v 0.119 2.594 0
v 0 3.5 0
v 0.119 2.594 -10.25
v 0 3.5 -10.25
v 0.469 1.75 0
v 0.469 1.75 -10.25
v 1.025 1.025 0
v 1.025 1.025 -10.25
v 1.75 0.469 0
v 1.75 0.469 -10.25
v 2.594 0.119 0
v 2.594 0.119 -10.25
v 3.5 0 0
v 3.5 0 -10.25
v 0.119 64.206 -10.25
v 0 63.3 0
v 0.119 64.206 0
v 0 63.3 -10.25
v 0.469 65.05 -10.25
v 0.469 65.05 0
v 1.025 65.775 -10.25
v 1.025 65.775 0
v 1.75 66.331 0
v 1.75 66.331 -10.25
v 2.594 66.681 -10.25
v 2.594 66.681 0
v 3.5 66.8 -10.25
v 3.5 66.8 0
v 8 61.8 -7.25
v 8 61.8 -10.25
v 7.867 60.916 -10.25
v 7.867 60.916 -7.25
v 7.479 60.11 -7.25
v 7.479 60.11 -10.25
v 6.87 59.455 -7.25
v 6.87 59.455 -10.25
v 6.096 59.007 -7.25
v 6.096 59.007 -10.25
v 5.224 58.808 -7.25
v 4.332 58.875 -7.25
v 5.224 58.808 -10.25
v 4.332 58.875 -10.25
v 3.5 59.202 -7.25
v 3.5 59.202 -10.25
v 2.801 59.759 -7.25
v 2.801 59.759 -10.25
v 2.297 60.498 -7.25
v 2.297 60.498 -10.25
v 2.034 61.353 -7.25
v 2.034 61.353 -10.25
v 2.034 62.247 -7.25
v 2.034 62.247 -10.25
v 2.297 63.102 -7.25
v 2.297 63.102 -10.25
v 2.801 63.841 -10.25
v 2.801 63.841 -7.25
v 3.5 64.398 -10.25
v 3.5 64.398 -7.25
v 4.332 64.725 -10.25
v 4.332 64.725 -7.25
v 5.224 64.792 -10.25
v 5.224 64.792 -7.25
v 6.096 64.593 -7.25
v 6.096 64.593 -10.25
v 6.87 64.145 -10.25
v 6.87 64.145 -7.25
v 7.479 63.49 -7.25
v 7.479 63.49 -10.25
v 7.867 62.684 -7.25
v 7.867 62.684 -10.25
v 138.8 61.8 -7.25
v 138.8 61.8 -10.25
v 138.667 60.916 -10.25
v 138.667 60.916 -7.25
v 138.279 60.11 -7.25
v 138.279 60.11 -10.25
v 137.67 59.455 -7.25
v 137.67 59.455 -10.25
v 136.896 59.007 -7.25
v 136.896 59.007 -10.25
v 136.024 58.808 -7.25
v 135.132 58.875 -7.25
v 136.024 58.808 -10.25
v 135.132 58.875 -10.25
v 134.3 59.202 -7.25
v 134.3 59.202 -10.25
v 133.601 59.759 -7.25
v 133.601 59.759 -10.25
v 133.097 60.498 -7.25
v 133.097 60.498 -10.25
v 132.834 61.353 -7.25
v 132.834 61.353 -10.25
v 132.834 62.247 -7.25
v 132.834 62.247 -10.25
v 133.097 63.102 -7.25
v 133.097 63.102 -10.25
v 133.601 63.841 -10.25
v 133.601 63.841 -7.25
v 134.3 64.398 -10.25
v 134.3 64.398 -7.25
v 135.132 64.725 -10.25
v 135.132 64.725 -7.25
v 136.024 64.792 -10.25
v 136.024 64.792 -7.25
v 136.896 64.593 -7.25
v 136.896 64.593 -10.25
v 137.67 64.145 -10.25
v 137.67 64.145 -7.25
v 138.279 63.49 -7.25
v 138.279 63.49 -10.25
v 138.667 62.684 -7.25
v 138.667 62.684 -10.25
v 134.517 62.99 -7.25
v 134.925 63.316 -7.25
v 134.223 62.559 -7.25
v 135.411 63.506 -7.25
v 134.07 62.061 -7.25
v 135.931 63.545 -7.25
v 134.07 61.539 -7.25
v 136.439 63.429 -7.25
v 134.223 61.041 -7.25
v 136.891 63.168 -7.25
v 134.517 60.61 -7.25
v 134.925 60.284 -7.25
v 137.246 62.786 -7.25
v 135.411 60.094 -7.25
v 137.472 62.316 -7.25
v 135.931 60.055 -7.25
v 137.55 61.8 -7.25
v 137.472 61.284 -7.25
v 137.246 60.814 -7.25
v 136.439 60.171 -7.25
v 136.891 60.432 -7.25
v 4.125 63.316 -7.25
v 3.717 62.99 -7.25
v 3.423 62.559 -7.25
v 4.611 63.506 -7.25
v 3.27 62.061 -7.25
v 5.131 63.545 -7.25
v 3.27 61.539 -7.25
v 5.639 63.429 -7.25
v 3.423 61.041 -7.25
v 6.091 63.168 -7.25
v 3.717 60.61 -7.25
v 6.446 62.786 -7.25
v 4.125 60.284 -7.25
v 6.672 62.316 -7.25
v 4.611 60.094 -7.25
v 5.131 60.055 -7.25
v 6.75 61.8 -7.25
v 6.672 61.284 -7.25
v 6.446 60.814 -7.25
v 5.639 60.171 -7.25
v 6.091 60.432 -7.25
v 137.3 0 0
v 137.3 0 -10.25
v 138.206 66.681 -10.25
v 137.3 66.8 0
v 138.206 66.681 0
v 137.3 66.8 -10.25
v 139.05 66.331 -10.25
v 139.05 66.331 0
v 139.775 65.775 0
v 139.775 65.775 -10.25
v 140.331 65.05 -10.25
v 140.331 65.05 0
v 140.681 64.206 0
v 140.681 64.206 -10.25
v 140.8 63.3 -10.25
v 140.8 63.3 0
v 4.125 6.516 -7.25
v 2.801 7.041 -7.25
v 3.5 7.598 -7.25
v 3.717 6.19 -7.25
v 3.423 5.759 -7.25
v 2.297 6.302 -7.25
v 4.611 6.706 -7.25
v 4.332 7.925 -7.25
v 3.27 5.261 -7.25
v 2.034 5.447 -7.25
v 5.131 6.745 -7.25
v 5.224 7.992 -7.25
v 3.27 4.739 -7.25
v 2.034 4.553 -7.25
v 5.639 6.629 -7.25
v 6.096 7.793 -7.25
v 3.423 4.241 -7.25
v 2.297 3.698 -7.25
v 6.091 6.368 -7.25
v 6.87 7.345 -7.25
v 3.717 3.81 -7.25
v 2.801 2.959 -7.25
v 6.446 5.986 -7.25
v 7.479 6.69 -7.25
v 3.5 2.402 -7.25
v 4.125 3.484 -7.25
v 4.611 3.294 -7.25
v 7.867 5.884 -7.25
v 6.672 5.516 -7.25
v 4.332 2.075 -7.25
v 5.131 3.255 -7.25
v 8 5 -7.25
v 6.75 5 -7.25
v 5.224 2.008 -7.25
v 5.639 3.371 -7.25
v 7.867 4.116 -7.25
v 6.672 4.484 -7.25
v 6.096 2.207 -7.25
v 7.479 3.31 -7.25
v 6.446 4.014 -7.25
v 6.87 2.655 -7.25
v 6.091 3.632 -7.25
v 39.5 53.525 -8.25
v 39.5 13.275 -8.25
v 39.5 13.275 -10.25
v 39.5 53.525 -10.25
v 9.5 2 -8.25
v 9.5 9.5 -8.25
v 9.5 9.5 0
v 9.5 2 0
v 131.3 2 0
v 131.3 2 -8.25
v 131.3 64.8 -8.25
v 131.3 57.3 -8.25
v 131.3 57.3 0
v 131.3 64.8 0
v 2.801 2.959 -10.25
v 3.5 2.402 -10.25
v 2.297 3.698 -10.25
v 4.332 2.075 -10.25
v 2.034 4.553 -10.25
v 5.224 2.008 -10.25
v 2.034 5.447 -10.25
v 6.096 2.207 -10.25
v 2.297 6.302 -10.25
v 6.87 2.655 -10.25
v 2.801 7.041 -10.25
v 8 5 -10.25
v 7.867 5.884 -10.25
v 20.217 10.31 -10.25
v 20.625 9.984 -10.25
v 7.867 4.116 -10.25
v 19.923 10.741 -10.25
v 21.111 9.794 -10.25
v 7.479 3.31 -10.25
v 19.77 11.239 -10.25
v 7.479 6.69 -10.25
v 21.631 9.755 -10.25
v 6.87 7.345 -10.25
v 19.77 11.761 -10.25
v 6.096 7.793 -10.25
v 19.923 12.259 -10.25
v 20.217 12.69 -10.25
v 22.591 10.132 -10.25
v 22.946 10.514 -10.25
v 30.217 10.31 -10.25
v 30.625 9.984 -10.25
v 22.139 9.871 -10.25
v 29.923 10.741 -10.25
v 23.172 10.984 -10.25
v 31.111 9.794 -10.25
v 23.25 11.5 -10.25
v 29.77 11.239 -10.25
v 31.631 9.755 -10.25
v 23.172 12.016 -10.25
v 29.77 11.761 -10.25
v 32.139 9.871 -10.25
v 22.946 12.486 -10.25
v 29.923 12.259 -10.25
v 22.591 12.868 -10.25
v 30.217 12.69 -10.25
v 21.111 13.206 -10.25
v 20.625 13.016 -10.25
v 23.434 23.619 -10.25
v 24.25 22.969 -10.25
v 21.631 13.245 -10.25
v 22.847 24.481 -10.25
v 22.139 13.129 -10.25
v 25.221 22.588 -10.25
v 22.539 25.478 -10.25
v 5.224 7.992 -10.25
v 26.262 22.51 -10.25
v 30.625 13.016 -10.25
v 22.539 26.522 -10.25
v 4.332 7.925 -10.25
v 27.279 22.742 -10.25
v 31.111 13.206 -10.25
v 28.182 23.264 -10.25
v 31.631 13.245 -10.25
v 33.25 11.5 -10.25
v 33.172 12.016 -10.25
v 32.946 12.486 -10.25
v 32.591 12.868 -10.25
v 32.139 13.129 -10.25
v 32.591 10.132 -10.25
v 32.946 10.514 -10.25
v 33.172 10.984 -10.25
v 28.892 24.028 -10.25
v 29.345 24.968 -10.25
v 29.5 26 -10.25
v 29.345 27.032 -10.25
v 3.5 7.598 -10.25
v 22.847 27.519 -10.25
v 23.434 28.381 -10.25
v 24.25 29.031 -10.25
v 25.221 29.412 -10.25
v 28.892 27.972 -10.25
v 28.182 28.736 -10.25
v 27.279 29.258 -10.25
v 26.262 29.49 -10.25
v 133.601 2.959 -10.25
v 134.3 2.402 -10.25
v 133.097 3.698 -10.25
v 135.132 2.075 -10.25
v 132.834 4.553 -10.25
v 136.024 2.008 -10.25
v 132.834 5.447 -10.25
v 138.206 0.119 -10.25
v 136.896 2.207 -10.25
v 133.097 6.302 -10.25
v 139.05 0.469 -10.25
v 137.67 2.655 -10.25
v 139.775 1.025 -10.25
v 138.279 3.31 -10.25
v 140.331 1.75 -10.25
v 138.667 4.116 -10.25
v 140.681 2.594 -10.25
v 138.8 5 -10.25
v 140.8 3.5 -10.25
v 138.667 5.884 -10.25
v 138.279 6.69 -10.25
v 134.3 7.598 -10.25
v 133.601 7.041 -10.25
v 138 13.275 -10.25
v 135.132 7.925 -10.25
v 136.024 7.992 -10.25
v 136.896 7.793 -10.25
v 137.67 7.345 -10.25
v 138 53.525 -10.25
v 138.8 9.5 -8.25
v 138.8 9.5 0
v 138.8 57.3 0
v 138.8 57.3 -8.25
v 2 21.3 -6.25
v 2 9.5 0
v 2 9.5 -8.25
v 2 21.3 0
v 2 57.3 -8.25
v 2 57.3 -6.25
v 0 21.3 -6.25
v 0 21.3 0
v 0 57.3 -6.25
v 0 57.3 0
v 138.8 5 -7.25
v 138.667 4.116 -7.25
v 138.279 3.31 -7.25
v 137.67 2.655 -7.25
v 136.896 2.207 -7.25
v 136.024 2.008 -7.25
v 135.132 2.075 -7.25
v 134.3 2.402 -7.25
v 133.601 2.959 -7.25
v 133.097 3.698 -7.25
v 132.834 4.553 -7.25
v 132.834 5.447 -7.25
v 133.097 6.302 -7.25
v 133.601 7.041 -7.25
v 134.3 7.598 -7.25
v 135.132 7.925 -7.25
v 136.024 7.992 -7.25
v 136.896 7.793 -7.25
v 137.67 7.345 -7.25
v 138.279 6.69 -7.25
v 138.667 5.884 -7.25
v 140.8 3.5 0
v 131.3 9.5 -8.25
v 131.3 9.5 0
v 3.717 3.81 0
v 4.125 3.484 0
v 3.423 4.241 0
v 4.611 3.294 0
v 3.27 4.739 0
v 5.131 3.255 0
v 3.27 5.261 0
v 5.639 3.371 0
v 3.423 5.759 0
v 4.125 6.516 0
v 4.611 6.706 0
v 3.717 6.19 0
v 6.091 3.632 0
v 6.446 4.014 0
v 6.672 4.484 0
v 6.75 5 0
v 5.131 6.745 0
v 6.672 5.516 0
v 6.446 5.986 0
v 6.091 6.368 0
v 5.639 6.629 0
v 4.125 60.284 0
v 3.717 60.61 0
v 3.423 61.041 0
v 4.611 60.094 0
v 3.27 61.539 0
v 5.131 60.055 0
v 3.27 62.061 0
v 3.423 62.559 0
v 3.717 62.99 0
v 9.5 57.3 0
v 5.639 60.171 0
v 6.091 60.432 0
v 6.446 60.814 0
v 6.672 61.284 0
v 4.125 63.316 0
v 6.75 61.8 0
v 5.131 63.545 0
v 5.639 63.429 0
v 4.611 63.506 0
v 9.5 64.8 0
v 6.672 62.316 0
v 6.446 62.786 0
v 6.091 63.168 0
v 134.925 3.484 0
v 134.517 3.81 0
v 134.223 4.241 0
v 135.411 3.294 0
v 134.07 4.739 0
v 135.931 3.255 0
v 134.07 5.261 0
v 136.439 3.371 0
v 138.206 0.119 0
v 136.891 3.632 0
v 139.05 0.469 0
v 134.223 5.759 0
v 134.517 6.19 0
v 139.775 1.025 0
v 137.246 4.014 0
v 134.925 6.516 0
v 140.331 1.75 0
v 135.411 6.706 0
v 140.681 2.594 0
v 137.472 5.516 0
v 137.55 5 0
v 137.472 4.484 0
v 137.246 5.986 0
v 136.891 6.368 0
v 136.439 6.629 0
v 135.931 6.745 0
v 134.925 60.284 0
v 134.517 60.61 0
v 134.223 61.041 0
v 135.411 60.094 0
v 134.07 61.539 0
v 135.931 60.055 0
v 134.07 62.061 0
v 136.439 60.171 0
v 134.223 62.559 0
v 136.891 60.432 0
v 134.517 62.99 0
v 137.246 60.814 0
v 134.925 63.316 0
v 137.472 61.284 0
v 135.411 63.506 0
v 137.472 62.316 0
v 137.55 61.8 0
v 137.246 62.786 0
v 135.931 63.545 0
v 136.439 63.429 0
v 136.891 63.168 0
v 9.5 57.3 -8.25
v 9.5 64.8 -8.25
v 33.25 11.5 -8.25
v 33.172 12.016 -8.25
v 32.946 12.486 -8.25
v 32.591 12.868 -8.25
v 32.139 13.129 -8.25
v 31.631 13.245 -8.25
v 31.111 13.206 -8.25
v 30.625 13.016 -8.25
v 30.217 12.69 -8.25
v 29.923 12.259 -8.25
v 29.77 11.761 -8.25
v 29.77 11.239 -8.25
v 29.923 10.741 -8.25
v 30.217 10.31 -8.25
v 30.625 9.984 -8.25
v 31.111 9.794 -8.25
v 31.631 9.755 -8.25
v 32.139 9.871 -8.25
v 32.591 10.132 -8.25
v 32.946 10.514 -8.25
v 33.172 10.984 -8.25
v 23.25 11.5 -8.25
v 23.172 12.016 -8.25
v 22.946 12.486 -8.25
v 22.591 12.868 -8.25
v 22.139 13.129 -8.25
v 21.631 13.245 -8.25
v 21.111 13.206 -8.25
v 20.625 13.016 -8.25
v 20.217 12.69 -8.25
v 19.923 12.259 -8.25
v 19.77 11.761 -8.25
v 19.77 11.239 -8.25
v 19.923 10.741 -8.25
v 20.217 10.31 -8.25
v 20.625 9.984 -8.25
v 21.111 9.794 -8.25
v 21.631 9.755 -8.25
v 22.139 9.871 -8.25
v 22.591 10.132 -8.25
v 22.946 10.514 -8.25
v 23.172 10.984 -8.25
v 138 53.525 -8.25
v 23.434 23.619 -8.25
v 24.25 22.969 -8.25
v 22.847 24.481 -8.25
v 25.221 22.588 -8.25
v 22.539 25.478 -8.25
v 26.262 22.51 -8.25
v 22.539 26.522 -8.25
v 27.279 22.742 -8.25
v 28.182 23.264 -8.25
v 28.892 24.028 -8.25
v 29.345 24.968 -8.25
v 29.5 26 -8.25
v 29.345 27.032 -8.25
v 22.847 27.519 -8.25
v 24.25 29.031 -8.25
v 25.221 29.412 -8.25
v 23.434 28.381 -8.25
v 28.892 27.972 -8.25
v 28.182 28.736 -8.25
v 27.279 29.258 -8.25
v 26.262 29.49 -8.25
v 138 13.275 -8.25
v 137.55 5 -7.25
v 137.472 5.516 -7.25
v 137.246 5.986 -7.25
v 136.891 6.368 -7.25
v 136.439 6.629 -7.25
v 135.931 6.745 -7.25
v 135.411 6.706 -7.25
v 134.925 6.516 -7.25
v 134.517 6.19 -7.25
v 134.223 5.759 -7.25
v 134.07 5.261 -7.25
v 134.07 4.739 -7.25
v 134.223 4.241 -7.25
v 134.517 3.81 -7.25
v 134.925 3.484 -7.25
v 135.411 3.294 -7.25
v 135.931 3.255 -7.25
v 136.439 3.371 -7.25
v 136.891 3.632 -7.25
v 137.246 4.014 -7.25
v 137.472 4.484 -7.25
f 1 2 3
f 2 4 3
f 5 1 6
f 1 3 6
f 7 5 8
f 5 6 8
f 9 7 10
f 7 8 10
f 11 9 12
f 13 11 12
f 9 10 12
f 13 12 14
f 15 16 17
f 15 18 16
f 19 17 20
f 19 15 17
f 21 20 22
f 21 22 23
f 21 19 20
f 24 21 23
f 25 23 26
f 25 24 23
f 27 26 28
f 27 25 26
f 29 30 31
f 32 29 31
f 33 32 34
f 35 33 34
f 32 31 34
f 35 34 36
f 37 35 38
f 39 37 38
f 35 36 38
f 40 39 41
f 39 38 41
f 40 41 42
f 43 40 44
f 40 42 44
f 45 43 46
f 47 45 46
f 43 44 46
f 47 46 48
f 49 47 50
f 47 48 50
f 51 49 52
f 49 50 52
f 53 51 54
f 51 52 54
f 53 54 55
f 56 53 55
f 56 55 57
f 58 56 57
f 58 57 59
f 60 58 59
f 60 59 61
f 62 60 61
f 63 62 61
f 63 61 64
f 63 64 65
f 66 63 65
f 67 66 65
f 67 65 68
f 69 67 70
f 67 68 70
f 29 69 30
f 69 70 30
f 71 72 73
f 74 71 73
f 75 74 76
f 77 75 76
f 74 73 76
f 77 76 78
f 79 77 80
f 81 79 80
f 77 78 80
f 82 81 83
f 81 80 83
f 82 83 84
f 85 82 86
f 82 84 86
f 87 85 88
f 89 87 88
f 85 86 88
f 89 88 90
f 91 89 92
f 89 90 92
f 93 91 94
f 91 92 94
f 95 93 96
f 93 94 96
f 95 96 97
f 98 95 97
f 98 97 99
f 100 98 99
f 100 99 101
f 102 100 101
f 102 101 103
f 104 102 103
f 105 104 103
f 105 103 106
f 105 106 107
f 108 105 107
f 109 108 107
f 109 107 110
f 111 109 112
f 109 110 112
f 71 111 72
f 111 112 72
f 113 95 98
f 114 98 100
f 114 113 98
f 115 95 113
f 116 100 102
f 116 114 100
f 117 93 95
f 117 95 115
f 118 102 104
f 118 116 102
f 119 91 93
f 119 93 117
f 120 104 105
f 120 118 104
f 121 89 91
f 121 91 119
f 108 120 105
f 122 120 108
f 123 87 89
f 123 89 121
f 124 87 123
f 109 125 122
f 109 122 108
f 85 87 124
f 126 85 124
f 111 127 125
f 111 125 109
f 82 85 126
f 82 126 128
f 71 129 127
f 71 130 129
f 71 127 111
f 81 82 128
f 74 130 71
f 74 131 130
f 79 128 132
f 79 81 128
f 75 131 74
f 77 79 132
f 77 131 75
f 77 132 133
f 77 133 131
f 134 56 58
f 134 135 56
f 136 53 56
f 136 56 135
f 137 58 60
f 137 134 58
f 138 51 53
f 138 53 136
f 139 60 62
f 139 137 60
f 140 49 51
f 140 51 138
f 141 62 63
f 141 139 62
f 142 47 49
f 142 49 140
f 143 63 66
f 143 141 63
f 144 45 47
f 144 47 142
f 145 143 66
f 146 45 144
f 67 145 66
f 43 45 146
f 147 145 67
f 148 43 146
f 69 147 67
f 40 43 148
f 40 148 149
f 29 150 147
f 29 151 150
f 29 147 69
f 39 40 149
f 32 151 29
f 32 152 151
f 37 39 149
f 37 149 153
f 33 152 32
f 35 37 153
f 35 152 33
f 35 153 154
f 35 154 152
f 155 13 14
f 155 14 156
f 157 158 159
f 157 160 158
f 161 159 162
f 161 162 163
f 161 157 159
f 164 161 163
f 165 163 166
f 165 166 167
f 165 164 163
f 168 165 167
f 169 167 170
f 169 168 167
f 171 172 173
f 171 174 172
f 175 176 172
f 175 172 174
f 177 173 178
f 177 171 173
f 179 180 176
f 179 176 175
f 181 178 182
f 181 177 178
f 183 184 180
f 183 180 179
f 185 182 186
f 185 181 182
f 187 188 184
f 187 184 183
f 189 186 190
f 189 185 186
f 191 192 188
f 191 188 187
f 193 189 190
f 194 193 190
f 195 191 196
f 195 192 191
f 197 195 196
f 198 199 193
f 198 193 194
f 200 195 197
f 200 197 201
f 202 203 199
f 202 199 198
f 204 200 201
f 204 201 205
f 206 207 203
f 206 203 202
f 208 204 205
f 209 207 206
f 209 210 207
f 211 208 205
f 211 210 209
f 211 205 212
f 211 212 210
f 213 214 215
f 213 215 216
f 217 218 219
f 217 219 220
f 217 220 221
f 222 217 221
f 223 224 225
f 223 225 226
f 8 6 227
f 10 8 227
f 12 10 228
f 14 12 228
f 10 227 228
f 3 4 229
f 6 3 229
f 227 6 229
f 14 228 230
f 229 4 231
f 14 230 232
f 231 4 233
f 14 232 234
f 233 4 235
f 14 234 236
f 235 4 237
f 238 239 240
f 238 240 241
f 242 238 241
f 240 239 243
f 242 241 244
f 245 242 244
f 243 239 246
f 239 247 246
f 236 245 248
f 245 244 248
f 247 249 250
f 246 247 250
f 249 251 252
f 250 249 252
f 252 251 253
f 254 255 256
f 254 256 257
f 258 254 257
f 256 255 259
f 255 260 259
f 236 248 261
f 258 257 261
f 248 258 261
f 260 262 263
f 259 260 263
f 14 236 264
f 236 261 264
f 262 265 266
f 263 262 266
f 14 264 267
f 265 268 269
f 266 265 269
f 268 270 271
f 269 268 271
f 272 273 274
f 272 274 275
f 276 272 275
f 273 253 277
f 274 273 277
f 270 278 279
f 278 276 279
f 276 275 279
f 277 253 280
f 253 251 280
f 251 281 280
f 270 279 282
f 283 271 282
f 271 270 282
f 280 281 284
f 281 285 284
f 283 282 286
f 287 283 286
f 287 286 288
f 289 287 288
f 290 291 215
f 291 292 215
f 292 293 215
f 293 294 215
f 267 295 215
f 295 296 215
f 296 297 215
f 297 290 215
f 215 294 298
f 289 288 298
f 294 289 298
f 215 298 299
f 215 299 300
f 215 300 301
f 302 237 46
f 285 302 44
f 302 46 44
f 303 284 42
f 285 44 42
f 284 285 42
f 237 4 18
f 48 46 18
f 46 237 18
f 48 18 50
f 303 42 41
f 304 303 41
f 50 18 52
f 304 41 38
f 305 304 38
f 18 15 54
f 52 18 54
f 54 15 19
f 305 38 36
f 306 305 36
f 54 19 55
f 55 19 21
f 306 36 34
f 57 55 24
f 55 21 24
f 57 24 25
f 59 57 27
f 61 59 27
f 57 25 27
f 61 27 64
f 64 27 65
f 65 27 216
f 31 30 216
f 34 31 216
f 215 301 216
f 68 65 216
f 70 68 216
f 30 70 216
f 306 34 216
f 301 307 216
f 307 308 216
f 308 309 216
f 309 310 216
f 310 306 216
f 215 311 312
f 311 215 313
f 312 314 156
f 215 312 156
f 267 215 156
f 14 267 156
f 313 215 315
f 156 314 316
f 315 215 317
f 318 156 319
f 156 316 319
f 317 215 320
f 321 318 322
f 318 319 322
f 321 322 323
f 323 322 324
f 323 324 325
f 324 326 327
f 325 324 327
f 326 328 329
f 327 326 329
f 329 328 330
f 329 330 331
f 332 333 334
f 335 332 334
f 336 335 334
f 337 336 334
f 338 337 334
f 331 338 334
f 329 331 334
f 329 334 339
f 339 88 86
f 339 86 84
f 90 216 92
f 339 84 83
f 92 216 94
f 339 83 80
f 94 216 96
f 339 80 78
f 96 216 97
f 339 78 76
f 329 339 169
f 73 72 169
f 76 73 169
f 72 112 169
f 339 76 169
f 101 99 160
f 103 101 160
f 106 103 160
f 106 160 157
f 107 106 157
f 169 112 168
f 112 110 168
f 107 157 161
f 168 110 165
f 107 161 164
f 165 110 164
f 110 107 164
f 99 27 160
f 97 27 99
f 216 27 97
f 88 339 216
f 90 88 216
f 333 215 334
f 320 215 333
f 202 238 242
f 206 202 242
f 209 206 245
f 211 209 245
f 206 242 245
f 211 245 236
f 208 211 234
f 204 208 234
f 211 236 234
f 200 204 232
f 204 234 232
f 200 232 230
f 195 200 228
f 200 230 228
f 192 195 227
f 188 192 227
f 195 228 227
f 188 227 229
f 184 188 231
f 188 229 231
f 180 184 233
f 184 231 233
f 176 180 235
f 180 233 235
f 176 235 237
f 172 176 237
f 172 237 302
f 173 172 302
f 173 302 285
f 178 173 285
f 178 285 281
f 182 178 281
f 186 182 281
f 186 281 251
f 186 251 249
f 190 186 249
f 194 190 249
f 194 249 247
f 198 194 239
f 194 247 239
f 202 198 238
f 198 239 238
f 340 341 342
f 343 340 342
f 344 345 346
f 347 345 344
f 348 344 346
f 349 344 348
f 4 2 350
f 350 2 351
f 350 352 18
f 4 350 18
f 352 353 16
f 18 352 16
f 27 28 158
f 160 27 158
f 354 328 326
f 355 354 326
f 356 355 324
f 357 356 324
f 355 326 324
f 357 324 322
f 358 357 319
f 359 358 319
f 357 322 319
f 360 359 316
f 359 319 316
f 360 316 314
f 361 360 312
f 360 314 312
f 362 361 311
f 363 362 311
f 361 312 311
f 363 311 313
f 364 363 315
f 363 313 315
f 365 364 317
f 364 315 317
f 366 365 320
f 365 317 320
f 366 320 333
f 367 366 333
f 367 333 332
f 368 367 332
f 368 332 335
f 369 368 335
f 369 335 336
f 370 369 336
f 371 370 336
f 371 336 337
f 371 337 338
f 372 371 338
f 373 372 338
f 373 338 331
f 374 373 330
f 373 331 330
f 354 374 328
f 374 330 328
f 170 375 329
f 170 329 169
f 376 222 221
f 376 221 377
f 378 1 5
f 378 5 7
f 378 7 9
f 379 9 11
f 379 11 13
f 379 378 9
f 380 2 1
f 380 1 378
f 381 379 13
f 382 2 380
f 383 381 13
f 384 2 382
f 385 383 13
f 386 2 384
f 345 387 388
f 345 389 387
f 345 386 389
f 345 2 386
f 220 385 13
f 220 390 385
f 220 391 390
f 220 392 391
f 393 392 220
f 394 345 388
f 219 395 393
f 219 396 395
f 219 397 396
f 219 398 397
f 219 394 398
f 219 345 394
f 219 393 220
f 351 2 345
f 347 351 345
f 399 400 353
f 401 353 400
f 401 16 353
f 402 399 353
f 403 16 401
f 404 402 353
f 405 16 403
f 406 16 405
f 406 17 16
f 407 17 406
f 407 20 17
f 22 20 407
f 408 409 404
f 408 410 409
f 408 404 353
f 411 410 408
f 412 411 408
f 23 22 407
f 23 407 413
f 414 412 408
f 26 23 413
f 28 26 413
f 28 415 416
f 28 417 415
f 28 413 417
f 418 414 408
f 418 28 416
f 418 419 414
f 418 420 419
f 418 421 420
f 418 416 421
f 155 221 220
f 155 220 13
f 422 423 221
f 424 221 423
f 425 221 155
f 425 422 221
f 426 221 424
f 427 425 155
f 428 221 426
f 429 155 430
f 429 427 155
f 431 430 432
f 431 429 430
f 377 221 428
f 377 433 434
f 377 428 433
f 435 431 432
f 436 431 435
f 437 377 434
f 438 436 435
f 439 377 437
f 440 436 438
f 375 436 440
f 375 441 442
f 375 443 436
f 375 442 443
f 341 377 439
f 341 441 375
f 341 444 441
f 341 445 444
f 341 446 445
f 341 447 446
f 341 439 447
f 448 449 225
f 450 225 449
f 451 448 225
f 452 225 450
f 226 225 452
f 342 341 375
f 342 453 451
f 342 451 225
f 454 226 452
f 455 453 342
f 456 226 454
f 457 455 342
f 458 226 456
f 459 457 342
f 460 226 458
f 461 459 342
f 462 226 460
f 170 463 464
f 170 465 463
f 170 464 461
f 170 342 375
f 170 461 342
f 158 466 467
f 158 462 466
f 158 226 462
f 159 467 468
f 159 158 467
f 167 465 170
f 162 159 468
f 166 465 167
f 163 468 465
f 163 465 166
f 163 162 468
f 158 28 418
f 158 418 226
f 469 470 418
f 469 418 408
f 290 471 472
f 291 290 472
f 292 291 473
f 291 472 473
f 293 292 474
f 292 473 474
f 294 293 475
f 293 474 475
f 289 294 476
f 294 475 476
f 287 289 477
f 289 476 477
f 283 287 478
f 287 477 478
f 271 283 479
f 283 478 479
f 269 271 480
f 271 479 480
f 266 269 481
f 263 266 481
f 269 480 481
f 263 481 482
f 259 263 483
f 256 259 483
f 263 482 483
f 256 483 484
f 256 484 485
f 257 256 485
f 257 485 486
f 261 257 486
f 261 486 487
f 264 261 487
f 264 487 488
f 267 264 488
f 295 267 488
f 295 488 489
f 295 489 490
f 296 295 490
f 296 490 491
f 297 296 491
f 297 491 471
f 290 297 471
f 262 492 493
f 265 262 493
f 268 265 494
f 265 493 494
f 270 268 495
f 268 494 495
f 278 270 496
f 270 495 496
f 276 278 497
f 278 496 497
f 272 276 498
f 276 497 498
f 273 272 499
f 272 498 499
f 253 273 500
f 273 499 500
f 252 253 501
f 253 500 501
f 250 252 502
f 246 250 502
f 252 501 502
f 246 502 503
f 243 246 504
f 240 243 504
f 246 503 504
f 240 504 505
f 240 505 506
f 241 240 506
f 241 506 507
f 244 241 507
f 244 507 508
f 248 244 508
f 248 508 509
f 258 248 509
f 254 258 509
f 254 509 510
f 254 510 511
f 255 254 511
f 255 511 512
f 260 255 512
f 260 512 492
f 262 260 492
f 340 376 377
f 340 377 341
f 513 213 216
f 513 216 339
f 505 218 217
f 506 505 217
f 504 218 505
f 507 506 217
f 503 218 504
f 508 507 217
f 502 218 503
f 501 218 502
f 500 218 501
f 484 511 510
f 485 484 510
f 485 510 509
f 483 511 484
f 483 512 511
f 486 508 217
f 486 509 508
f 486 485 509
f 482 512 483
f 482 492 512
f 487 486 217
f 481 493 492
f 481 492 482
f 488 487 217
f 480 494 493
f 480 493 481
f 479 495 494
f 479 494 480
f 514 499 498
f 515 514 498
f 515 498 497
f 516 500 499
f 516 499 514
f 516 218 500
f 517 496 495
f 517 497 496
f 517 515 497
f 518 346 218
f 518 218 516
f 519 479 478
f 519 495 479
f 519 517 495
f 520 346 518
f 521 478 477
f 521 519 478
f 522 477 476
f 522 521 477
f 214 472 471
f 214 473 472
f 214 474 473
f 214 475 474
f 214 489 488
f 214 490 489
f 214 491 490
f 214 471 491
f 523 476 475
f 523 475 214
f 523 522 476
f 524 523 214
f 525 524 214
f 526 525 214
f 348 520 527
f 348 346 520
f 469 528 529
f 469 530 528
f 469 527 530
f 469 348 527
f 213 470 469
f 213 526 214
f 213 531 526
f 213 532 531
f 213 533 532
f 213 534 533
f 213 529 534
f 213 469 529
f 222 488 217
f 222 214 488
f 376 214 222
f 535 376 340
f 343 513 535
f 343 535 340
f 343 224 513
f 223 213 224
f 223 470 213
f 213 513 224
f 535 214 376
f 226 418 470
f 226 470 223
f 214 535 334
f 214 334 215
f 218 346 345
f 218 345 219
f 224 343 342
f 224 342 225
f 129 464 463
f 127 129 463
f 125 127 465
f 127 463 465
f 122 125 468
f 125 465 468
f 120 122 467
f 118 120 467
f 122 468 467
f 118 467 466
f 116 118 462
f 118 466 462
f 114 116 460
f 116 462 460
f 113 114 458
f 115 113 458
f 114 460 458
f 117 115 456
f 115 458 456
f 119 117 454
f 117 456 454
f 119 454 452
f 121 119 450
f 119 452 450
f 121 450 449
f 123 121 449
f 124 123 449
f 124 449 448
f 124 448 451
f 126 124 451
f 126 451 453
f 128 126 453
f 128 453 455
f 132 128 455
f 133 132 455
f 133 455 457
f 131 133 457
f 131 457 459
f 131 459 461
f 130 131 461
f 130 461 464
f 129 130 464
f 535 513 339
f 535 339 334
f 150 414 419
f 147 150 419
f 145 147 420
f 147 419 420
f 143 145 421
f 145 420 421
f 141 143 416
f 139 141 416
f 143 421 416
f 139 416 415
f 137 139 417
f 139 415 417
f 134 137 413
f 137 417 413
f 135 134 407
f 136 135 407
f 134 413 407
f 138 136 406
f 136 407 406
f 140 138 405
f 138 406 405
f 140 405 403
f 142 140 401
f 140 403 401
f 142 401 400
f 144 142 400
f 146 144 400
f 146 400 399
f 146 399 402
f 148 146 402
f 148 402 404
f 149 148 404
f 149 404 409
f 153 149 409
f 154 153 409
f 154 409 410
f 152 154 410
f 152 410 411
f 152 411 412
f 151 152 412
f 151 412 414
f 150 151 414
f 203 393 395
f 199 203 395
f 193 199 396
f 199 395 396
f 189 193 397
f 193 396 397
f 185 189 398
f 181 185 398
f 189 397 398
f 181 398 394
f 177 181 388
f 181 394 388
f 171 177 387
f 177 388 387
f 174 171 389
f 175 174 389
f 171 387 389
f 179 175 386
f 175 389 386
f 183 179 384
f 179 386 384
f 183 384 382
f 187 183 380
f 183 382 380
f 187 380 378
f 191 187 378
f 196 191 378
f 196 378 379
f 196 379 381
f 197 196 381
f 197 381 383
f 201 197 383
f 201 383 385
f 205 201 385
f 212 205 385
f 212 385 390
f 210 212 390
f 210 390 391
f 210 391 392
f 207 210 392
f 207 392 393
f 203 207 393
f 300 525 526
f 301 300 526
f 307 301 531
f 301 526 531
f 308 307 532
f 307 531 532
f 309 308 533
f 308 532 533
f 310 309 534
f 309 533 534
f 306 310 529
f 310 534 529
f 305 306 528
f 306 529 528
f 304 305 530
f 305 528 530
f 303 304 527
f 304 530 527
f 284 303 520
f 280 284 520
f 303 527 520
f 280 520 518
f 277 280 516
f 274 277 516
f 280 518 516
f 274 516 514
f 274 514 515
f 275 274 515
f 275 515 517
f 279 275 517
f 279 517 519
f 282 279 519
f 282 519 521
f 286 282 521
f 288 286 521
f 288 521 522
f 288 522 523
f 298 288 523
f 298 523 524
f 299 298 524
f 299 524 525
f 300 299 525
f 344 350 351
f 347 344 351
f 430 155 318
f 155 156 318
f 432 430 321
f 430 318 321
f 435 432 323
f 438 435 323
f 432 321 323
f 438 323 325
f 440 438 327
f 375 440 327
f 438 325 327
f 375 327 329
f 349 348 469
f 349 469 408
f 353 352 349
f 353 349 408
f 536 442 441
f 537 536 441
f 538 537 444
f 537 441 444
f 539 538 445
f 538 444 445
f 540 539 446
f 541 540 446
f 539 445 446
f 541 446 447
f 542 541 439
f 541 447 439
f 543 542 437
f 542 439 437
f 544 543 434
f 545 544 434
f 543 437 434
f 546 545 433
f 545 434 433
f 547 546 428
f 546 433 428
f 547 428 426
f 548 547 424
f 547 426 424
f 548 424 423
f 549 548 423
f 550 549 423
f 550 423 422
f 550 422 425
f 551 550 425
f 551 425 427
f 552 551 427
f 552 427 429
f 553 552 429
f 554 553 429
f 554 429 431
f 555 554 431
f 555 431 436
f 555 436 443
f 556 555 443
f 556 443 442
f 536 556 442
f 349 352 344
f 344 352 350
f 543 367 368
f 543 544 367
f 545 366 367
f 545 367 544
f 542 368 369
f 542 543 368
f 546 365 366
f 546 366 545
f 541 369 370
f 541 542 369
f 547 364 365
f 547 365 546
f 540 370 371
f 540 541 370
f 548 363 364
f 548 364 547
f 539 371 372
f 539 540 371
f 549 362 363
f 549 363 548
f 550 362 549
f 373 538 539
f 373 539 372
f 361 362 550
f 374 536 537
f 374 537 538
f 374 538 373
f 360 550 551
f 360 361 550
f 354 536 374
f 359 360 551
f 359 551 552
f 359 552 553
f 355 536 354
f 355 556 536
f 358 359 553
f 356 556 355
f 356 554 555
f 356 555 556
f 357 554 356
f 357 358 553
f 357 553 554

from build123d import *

# Parameters (mm, degrees)
F0_W     = 140.8
F0_H     = 66.8
F0_R     = 1.75
F0_R_2   = 3.5
F0_W_2   = 7.5
F0_H_2   = 47.8
F0_H_3   = 7.5
F0_W_3   = 121.8
F1_DEPTH = 10.25
F2_DEPTH = 8.25
F3_R     = 3.5
F4_R     = 3
F5_DEPTH = 3
F6_W     = 36
F6_H     = 6.25
F7_DEPTH = 2


with BuildPart() as f1:
    # F0 (on Top) → F1 (new body)
    with BuildSketch(Plane.XY):
        with Locations((70.4, 33.4)):
            Rectangle(F0_W, F0_H)
        Polygon((2, 57.3), (2, 64.8), (9.5, 64.8), (131.3, 64.8), (138.8, 64.8), (138.8, 57.3), (138.8, 9.5), (138.8, 2), (131.3, 2), (9.5, 2), (2, 2), (2, 9.5), align=None, mode=Mode.SUBTRACT)
        Polygon((131.3, 57.3), (9.5, 57.3), (9.5, 9.5), (131.3, 9.5), (131.3, 13.275), (39.5, 13.275), (39.5, 53.525), (131.3, 53.525), align=None)
        with Locations((21.5, 11.5)):
            Circle(F0_R, mode=Mode.SUBTRACT)
        with Locations((31.5, 11.5)):
            Circle(F0_R, mode=Mode.SUBTRACT)
        with Locations((26, 26)):
            Circle(F0_R_2, mode=Mode.SUBTRACT)
        with Locations((5.75, 33.4)):
            Rectangle(F0_W_2, F0_H_2)
        with Locations((5.75, 61.05)):
            Rectangle(F0_W_2, F0_H_3)
        with Locations((5, 61.8)):
            Circle(F0_R, mode=Mode.SUBTRACT)
        with Locations((70.4, 61.05)):
            Rectangle(F0_W_3, F0_H_3)
        with Locations((135.05, 61.05)):
            Rectangle(F0_W_2, F0_H_3)
        with Locations((135.8, 61.8)):
            Circle(F0_R, mode=Mode.SUBTRACT)
        Polygon((138.8, 57.3), (131.3, 57.3), (131.3, 53.525), (138, 53.525), (138, 13.275), (131.3, 13.275), (131.3, 9.5), (138.8, 9.5), align=None)
        with Locations((135.05, 5.75)):
            Rectangle(F0_W_2, F0_H_3)
        with Locations((135.8, 5)):
            Circle(F0_R, mode=Mode.SUBTRACT)
        with Locations((70.4, 5.75)):
            Rectangle(F0_W_3, F0_H_3)
        with Locations((5.75, 5.75)):
            Rectangle(F0_W_2, F0_H_3)
        with Locations((5, 5)):
            Circle(F0_R, mode=Mode.SUBTRACT)
    extrude(amount=-F1_DEPTH)

    # F0 (on Top) → F2 (cut)
    with BuildSketch(Plane.XY):
        with Locations((70.4, 61.05)):
            Rectangle(F0_W_3, F0_H_3)
        Polygon((131.3, 57.3), (9.5, 57.3), (9.5, 9.5), (131.3, 9.5), (131.3, 13.275), (39.5, 13.275), (39.5, 53.525), (131.3, 53.525), align=None)
        with Locations((21.5, 11.5)):
            Circle(F0_R, mode=Mode.SUBTRACT)
        with Locations((31.5, 11.5)):
            Circle(F0_R, mode=Mode.SUBTRACT)
        with Locations((26, 26)):
            Circle(F0_R_2, mode=Mode.SUBTRACT)
        with Locations((70.4, 5.75)):
            Rectangle(F0_W_3, F0_H_3)
        with Locations((5.75, 33.4)):
            Rectangle(F0_W_2, F0_H_2)
        Polygon((138.8, 57.3), (131.3, 57.3), (131.3, 53.525), (138, 53.525), (138, 13.275), (131.3, 13.275), (131.3, 9.5), (138.8, 9.5), align=None)
    extrude(amount=-F2_DEPTH, mode=Mode.SUBTRACT)

    # F3
    f3_edges = [f1.edges().sort_by_distance(p)[0] for p in [
        (140.8, 66.8, -5.125),
        (0, 66.8, -5.125),
        (0, 0, -5.125),
        (140.8, 0, -5.125),
    ]]
    fillet(f3_edges, radius=F3_R)

    # F4 (on face) → F5 (cut)
    with BuildSketch(Plane(origin=(0, 0, -10.25), x_dir=(1, 0, 0), z_dir=(0, 0, -1))):
        with Locations((5, -5)):
            Circle(F4_R)
        with Locations((135.8, -5)):
            Circle(F4_R)
        with Locations((135.8, -61.8)):
            Circle(F4_R)
        with Locations((5, -61.8)):
            Circle(F4_R)
    extrude(amount=-F5_DEPTH, mode=Mode.SUBTRACT)

    # F6 (on face) → F7 (cut)
    with BuildSketch(Plane(origin=(0, 0, 0), x_dir=(0, -1, 0), z_dir=(-1, 0, 0))):
        with Locations((-39.3, -3.125)):
            Rectangle(F6_W, F6_H)
    extrude(amount=-F7_DEPTH, mode=Mode.SUBTRACT)


solid = f1.part
